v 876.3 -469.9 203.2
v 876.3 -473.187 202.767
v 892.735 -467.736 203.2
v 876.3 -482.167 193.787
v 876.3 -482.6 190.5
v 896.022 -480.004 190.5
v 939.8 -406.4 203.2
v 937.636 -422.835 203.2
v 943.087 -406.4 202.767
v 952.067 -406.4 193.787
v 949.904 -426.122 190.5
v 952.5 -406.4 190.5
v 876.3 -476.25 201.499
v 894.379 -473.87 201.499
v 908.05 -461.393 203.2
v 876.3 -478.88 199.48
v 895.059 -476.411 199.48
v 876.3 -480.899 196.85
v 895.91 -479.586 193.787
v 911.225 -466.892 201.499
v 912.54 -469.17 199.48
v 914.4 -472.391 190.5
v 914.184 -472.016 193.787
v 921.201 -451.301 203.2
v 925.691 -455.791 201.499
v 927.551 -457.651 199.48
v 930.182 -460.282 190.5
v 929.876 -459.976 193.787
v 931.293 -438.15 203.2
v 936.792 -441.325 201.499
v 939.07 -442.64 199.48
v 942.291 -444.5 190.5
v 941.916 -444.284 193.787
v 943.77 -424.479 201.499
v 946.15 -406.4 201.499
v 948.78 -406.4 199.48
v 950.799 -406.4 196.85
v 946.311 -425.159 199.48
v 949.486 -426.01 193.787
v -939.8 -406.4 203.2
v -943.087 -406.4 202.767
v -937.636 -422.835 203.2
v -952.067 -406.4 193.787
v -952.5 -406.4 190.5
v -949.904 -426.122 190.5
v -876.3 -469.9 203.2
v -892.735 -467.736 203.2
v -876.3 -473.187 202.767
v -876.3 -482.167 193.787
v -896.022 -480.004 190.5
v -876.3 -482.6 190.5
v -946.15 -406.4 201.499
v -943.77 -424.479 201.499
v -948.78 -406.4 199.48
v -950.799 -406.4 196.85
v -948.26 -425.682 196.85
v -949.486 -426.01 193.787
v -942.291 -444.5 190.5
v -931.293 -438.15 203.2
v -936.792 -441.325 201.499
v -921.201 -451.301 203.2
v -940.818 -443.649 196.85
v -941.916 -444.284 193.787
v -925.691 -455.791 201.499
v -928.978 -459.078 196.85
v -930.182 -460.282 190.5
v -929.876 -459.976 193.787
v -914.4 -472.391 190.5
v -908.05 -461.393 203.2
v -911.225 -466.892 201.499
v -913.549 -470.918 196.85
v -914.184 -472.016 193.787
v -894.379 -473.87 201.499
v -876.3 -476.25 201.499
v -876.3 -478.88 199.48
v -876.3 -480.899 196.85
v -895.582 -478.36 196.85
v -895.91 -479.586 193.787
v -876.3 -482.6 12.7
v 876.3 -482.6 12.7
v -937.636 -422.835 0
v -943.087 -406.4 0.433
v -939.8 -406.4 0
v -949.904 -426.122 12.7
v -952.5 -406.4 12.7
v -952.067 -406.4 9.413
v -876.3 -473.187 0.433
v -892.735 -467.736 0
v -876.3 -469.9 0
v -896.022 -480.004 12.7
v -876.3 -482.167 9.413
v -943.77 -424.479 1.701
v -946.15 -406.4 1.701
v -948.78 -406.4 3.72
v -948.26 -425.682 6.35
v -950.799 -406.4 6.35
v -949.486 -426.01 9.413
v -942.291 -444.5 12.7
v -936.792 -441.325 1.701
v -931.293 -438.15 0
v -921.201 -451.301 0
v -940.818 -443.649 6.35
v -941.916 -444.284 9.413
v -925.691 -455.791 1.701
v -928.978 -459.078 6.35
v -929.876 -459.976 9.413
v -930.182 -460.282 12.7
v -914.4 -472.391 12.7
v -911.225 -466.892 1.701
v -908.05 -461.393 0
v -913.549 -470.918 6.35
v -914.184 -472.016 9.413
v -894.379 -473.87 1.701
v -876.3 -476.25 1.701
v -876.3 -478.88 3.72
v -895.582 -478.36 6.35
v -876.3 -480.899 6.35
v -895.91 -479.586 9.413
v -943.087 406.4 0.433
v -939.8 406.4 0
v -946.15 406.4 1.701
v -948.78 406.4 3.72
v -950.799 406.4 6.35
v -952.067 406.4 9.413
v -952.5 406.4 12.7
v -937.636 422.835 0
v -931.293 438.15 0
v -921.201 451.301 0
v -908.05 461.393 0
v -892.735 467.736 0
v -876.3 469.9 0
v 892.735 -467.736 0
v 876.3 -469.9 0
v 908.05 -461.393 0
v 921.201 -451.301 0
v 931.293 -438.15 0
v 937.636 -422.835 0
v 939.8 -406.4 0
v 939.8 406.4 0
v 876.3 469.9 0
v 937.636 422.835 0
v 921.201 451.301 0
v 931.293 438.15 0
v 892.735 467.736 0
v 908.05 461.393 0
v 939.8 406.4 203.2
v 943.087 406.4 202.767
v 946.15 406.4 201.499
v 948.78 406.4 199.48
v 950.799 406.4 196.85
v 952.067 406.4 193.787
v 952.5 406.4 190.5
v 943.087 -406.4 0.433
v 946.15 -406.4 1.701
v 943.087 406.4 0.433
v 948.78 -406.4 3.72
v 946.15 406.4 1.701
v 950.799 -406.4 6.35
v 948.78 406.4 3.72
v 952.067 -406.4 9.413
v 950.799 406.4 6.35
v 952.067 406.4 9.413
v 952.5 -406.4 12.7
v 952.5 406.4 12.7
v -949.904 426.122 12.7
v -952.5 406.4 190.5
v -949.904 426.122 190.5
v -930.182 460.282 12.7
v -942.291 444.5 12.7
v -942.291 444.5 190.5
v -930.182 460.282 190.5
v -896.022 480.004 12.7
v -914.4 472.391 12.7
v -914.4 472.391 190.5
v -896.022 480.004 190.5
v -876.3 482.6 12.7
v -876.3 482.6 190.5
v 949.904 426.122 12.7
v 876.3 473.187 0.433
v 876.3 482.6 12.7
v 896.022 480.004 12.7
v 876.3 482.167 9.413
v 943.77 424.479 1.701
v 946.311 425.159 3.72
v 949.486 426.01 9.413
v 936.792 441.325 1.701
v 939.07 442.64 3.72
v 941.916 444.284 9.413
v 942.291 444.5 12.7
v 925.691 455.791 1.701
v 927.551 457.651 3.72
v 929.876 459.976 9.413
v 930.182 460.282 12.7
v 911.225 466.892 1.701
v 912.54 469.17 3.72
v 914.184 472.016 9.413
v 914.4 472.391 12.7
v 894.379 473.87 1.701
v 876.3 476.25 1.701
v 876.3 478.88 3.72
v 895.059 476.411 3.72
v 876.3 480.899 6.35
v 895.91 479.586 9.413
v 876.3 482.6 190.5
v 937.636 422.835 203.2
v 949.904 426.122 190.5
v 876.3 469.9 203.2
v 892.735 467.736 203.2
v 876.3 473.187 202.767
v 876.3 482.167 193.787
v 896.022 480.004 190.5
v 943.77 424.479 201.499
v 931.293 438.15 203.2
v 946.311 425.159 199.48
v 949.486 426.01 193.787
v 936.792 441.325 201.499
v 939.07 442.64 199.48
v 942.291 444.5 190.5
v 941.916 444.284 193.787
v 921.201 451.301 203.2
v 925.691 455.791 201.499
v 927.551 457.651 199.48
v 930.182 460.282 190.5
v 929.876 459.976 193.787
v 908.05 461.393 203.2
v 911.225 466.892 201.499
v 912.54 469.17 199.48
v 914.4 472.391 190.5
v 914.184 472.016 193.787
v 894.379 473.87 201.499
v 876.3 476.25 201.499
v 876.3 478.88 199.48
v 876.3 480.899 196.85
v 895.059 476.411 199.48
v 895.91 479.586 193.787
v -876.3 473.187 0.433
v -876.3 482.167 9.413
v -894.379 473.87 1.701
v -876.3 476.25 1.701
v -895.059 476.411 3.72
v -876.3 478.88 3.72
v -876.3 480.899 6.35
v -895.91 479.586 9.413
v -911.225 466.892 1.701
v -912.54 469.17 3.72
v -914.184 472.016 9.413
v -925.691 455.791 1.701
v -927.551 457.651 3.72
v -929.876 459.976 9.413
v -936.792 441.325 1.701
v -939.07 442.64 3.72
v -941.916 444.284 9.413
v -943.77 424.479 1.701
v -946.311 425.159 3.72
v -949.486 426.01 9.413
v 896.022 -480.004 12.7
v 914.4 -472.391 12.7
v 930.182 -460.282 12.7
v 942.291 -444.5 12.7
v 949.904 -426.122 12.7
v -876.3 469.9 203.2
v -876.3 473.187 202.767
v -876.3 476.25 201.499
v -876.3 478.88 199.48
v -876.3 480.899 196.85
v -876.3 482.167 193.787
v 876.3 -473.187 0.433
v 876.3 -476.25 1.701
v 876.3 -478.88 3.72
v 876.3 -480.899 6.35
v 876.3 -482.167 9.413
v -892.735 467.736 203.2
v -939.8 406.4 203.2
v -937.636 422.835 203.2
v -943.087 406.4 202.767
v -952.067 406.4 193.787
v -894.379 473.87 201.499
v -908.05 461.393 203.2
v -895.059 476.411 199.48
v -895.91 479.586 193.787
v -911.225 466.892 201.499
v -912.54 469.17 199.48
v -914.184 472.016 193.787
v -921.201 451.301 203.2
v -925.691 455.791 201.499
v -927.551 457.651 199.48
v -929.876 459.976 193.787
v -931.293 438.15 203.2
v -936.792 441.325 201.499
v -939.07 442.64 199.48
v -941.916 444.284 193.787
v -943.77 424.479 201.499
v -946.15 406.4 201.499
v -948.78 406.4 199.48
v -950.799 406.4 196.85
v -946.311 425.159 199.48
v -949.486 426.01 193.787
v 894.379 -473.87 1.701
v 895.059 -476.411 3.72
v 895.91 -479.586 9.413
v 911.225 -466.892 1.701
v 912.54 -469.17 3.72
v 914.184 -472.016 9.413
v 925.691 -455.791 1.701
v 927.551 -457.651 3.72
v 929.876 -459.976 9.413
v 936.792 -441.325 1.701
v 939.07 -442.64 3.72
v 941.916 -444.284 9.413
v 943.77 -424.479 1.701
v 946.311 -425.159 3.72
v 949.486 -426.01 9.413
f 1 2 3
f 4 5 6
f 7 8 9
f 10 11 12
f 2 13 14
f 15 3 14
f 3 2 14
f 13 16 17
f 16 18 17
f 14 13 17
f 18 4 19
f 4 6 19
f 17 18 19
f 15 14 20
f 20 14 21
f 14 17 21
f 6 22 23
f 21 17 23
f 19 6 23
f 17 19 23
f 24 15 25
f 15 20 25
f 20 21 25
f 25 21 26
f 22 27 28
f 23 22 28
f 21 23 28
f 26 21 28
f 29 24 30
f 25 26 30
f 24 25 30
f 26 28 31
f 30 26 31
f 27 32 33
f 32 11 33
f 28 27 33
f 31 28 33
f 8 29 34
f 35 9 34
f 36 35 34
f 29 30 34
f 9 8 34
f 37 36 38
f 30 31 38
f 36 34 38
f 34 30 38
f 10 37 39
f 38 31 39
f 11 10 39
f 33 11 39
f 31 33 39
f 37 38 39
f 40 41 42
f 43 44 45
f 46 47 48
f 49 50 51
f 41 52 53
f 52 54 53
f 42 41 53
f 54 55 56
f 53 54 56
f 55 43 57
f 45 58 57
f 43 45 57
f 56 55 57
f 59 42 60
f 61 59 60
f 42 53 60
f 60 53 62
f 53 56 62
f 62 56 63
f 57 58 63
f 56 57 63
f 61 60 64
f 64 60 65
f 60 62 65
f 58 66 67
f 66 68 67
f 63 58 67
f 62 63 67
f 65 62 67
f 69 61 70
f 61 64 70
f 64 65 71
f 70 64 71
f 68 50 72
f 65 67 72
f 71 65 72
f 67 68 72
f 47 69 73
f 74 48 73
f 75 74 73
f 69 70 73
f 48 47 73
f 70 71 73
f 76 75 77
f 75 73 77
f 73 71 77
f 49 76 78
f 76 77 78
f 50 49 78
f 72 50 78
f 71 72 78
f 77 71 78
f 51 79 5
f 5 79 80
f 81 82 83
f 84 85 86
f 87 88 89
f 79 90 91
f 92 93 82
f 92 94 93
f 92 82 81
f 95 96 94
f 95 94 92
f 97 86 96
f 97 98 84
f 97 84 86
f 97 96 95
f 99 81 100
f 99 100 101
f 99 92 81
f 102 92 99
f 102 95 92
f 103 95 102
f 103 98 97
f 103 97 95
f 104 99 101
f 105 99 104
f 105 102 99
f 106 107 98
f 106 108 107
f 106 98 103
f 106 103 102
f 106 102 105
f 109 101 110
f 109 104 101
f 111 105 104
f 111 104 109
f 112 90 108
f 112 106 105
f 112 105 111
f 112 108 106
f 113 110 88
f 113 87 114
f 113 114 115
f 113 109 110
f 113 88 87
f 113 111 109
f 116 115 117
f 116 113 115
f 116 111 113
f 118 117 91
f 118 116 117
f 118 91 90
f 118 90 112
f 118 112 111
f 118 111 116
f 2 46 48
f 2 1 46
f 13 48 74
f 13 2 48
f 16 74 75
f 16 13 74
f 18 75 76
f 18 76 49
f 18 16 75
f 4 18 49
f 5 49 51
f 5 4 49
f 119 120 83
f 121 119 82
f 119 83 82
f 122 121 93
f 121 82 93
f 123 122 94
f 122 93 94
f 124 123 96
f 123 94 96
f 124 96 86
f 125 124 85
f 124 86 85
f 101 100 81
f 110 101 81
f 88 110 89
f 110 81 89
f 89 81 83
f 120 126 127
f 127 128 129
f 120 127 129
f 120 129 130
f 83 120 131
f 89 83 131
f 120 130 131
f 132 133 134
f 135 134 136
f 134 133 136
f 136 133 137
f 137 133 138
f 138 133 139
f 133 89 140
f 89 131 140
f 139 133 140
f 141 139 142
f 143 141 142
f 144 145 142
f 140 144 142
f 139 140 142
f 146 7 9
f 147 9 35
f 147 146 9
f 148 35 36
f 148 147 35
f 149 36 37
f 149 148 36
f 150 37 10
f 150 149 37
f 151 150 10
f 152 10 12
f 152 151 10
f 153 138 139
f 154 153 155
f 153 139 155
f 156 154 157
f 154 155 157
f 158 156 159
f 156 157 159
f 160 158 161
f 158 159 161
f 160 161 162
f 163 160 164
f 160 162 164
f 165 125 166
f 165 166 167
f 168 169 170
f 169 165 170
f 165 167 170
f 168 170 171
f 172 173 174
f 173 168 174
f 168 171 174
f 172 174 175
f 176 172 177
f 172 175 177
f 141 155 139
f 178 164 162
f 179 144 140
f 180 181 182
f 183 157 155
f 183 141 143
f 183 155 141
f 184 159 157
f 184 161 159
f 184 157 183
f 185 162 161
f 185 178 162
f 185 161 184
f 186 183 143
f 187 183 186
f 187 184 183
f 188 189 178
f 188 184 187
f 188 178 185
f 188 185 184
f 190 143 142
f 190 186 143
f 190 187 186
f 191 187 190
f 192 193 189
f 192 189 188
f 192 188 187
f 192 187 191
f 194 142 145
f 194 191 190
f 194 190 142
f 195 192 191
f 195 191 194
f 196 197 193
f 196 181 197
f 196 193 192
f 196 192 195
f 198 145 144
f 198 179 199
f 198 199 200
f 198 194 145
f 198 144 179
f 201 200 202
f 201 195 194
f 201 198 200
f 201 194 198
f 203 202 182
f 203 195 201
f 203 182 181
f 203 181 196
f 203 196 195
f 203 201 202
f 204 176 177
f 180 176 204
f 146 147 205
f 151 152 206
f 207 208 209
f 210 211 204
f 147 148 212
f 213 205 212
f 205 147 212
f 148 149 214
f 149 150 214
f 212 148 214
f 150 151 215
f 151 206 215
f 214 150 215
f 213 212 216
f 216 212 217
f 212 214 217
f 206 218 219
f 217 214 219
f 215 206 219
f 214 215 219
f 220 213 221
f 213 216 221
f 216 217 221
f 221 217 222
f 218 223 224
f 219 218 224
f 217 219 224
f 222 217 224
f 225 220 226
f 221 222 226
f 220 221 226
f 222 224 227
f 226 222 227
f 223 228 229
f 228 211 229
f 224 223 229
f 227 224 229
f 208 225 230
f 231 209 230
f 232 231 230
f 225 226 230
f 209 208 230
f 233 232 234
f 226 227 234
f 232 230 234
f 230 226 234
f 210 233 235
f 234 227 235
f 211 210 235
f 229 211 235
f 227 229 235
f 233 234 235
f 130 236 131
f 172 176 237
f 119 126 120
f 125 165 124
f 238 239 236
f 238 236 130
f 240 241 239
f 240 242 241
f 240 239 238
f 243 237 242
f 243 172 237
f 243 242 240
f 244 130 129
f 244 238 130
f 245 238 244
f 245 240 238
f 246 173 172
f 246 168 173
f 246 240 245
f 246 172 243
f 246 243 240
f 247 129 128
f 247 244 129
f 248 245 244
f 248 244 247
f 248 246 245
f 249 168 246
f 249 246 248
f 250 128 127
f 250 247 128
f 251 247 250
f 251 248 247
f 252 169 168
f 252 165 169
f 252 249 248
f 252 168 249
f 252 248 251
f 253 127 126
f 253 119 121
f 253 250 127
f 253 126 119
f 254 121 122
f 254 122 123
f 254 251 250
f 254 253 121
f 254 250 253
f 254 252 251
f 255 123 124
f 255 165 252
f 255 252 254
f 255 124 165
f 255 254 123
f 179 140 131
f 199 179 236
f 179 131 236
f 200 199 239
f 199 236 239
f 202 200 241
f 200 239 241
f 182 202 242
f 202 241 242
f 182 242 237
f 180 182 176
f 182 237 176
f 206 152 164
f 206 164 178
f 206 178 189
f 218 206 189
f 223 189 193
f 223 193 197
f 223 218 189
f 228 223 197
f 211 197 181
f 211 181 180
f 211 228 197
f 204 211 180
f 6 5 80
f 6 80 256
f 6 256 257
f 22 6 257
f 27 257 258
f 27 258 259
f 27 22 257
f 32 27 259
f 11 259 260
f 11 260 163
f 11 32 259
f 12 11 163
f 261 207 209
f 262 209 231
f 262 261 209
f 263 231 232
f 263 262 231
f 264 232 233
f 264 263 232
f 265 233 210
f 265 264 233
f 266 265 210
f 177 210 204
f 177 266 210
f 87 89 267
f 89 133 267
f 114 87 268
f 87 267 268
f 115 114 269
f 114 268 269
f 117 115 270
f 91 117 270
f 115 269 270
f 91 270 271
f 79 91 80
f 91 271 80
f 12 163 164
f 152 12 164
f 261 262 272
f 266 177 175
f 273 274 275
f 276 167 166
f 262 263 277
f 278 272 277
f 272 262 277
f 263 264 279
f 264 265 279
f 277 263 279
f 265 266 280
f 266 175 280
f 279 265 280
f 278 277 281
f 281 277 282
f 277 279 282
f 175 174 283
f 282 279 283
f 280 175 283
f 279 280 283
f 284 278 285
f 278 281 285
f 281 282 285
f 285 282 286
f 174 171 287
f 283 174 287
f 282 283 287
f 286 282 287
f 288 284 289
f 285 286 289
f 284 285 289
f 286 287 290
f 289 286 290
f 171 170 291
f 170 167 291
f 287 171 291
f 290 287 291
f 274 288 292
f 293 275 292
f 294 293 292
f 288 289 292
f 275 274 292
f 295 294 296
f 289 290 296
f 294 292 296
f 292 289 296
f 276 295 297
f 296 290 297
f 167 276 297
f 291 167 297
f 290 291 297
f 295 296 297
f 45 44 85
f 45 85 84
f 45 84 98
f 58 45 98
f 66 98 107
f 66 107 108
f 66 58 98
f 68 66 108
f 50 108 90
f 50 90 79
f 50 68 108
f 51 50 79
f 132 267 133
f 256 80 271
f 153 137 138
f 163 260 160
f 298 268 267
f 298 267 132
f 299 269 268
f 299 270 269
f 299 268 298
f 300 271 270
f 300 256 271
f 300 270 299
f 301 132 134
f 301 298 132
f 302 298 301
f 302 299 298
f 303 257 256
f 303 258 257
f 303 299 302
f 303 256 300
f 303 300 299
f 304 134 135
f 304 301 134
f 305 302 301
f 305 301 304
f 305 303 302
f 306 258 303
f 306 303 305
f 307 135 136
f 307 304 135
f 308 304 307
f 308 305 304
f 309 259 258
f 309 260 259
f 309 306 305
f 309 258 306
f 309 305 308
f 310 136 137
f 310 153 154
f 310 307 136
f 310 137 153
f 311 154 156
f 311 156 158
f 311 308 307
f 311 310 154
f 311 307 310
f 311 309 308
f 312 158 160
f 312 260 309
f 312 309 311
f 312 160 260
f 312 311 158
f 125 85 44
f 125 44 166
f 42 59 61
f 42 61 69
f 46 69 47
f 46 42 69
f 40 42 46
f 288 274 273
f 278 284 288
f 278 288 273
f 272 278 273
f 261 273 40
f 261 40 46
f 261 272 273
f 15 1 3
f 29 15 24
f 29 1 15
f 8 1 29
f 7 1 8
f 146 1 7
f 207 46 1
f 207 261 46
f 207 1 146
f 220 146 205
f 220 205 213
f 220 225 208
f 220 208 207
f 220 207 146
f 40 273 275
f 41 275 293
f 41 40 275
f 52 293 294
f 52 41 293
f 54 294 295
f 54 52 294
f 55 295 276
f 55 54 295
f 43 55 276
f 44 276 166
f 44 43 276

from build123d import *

# Parameters (mm, degrees)
F0_W     = 1905
F0_H     = 965.2
F1_DEPTH = 203.2
F2_R     = 76.2
F3_R     = 12.7


with BuildPart() as f1:
    # F0 (on Top) → F1 (new body)
    with BuildSketch(Plane.XY):
        Rectangle(F0_W, F0_H)
    extrude(amount=F1_DEPTH)

    # F2
    f2_edges = [f1.edges().sort_by_distance(p)[0] for p in [
        (-952.5, -482.6, 101.6),
        (952.5, -482.6, 101.6),
        (952.5, 482.6, 101.6),
        (-952.5, 482.6, 101.6),
    ]]
    fillet(f2_edges, radius=F2_R)

    # F3
    f3_edges = [f1.edges().sort_by_distance(p)[0] for p in [
        (0, -482.6, 203.2),
        (0, -482.6, 0),
    ]]
    fillet(f3_edges, radius=F3_R)


solid = f1.part
